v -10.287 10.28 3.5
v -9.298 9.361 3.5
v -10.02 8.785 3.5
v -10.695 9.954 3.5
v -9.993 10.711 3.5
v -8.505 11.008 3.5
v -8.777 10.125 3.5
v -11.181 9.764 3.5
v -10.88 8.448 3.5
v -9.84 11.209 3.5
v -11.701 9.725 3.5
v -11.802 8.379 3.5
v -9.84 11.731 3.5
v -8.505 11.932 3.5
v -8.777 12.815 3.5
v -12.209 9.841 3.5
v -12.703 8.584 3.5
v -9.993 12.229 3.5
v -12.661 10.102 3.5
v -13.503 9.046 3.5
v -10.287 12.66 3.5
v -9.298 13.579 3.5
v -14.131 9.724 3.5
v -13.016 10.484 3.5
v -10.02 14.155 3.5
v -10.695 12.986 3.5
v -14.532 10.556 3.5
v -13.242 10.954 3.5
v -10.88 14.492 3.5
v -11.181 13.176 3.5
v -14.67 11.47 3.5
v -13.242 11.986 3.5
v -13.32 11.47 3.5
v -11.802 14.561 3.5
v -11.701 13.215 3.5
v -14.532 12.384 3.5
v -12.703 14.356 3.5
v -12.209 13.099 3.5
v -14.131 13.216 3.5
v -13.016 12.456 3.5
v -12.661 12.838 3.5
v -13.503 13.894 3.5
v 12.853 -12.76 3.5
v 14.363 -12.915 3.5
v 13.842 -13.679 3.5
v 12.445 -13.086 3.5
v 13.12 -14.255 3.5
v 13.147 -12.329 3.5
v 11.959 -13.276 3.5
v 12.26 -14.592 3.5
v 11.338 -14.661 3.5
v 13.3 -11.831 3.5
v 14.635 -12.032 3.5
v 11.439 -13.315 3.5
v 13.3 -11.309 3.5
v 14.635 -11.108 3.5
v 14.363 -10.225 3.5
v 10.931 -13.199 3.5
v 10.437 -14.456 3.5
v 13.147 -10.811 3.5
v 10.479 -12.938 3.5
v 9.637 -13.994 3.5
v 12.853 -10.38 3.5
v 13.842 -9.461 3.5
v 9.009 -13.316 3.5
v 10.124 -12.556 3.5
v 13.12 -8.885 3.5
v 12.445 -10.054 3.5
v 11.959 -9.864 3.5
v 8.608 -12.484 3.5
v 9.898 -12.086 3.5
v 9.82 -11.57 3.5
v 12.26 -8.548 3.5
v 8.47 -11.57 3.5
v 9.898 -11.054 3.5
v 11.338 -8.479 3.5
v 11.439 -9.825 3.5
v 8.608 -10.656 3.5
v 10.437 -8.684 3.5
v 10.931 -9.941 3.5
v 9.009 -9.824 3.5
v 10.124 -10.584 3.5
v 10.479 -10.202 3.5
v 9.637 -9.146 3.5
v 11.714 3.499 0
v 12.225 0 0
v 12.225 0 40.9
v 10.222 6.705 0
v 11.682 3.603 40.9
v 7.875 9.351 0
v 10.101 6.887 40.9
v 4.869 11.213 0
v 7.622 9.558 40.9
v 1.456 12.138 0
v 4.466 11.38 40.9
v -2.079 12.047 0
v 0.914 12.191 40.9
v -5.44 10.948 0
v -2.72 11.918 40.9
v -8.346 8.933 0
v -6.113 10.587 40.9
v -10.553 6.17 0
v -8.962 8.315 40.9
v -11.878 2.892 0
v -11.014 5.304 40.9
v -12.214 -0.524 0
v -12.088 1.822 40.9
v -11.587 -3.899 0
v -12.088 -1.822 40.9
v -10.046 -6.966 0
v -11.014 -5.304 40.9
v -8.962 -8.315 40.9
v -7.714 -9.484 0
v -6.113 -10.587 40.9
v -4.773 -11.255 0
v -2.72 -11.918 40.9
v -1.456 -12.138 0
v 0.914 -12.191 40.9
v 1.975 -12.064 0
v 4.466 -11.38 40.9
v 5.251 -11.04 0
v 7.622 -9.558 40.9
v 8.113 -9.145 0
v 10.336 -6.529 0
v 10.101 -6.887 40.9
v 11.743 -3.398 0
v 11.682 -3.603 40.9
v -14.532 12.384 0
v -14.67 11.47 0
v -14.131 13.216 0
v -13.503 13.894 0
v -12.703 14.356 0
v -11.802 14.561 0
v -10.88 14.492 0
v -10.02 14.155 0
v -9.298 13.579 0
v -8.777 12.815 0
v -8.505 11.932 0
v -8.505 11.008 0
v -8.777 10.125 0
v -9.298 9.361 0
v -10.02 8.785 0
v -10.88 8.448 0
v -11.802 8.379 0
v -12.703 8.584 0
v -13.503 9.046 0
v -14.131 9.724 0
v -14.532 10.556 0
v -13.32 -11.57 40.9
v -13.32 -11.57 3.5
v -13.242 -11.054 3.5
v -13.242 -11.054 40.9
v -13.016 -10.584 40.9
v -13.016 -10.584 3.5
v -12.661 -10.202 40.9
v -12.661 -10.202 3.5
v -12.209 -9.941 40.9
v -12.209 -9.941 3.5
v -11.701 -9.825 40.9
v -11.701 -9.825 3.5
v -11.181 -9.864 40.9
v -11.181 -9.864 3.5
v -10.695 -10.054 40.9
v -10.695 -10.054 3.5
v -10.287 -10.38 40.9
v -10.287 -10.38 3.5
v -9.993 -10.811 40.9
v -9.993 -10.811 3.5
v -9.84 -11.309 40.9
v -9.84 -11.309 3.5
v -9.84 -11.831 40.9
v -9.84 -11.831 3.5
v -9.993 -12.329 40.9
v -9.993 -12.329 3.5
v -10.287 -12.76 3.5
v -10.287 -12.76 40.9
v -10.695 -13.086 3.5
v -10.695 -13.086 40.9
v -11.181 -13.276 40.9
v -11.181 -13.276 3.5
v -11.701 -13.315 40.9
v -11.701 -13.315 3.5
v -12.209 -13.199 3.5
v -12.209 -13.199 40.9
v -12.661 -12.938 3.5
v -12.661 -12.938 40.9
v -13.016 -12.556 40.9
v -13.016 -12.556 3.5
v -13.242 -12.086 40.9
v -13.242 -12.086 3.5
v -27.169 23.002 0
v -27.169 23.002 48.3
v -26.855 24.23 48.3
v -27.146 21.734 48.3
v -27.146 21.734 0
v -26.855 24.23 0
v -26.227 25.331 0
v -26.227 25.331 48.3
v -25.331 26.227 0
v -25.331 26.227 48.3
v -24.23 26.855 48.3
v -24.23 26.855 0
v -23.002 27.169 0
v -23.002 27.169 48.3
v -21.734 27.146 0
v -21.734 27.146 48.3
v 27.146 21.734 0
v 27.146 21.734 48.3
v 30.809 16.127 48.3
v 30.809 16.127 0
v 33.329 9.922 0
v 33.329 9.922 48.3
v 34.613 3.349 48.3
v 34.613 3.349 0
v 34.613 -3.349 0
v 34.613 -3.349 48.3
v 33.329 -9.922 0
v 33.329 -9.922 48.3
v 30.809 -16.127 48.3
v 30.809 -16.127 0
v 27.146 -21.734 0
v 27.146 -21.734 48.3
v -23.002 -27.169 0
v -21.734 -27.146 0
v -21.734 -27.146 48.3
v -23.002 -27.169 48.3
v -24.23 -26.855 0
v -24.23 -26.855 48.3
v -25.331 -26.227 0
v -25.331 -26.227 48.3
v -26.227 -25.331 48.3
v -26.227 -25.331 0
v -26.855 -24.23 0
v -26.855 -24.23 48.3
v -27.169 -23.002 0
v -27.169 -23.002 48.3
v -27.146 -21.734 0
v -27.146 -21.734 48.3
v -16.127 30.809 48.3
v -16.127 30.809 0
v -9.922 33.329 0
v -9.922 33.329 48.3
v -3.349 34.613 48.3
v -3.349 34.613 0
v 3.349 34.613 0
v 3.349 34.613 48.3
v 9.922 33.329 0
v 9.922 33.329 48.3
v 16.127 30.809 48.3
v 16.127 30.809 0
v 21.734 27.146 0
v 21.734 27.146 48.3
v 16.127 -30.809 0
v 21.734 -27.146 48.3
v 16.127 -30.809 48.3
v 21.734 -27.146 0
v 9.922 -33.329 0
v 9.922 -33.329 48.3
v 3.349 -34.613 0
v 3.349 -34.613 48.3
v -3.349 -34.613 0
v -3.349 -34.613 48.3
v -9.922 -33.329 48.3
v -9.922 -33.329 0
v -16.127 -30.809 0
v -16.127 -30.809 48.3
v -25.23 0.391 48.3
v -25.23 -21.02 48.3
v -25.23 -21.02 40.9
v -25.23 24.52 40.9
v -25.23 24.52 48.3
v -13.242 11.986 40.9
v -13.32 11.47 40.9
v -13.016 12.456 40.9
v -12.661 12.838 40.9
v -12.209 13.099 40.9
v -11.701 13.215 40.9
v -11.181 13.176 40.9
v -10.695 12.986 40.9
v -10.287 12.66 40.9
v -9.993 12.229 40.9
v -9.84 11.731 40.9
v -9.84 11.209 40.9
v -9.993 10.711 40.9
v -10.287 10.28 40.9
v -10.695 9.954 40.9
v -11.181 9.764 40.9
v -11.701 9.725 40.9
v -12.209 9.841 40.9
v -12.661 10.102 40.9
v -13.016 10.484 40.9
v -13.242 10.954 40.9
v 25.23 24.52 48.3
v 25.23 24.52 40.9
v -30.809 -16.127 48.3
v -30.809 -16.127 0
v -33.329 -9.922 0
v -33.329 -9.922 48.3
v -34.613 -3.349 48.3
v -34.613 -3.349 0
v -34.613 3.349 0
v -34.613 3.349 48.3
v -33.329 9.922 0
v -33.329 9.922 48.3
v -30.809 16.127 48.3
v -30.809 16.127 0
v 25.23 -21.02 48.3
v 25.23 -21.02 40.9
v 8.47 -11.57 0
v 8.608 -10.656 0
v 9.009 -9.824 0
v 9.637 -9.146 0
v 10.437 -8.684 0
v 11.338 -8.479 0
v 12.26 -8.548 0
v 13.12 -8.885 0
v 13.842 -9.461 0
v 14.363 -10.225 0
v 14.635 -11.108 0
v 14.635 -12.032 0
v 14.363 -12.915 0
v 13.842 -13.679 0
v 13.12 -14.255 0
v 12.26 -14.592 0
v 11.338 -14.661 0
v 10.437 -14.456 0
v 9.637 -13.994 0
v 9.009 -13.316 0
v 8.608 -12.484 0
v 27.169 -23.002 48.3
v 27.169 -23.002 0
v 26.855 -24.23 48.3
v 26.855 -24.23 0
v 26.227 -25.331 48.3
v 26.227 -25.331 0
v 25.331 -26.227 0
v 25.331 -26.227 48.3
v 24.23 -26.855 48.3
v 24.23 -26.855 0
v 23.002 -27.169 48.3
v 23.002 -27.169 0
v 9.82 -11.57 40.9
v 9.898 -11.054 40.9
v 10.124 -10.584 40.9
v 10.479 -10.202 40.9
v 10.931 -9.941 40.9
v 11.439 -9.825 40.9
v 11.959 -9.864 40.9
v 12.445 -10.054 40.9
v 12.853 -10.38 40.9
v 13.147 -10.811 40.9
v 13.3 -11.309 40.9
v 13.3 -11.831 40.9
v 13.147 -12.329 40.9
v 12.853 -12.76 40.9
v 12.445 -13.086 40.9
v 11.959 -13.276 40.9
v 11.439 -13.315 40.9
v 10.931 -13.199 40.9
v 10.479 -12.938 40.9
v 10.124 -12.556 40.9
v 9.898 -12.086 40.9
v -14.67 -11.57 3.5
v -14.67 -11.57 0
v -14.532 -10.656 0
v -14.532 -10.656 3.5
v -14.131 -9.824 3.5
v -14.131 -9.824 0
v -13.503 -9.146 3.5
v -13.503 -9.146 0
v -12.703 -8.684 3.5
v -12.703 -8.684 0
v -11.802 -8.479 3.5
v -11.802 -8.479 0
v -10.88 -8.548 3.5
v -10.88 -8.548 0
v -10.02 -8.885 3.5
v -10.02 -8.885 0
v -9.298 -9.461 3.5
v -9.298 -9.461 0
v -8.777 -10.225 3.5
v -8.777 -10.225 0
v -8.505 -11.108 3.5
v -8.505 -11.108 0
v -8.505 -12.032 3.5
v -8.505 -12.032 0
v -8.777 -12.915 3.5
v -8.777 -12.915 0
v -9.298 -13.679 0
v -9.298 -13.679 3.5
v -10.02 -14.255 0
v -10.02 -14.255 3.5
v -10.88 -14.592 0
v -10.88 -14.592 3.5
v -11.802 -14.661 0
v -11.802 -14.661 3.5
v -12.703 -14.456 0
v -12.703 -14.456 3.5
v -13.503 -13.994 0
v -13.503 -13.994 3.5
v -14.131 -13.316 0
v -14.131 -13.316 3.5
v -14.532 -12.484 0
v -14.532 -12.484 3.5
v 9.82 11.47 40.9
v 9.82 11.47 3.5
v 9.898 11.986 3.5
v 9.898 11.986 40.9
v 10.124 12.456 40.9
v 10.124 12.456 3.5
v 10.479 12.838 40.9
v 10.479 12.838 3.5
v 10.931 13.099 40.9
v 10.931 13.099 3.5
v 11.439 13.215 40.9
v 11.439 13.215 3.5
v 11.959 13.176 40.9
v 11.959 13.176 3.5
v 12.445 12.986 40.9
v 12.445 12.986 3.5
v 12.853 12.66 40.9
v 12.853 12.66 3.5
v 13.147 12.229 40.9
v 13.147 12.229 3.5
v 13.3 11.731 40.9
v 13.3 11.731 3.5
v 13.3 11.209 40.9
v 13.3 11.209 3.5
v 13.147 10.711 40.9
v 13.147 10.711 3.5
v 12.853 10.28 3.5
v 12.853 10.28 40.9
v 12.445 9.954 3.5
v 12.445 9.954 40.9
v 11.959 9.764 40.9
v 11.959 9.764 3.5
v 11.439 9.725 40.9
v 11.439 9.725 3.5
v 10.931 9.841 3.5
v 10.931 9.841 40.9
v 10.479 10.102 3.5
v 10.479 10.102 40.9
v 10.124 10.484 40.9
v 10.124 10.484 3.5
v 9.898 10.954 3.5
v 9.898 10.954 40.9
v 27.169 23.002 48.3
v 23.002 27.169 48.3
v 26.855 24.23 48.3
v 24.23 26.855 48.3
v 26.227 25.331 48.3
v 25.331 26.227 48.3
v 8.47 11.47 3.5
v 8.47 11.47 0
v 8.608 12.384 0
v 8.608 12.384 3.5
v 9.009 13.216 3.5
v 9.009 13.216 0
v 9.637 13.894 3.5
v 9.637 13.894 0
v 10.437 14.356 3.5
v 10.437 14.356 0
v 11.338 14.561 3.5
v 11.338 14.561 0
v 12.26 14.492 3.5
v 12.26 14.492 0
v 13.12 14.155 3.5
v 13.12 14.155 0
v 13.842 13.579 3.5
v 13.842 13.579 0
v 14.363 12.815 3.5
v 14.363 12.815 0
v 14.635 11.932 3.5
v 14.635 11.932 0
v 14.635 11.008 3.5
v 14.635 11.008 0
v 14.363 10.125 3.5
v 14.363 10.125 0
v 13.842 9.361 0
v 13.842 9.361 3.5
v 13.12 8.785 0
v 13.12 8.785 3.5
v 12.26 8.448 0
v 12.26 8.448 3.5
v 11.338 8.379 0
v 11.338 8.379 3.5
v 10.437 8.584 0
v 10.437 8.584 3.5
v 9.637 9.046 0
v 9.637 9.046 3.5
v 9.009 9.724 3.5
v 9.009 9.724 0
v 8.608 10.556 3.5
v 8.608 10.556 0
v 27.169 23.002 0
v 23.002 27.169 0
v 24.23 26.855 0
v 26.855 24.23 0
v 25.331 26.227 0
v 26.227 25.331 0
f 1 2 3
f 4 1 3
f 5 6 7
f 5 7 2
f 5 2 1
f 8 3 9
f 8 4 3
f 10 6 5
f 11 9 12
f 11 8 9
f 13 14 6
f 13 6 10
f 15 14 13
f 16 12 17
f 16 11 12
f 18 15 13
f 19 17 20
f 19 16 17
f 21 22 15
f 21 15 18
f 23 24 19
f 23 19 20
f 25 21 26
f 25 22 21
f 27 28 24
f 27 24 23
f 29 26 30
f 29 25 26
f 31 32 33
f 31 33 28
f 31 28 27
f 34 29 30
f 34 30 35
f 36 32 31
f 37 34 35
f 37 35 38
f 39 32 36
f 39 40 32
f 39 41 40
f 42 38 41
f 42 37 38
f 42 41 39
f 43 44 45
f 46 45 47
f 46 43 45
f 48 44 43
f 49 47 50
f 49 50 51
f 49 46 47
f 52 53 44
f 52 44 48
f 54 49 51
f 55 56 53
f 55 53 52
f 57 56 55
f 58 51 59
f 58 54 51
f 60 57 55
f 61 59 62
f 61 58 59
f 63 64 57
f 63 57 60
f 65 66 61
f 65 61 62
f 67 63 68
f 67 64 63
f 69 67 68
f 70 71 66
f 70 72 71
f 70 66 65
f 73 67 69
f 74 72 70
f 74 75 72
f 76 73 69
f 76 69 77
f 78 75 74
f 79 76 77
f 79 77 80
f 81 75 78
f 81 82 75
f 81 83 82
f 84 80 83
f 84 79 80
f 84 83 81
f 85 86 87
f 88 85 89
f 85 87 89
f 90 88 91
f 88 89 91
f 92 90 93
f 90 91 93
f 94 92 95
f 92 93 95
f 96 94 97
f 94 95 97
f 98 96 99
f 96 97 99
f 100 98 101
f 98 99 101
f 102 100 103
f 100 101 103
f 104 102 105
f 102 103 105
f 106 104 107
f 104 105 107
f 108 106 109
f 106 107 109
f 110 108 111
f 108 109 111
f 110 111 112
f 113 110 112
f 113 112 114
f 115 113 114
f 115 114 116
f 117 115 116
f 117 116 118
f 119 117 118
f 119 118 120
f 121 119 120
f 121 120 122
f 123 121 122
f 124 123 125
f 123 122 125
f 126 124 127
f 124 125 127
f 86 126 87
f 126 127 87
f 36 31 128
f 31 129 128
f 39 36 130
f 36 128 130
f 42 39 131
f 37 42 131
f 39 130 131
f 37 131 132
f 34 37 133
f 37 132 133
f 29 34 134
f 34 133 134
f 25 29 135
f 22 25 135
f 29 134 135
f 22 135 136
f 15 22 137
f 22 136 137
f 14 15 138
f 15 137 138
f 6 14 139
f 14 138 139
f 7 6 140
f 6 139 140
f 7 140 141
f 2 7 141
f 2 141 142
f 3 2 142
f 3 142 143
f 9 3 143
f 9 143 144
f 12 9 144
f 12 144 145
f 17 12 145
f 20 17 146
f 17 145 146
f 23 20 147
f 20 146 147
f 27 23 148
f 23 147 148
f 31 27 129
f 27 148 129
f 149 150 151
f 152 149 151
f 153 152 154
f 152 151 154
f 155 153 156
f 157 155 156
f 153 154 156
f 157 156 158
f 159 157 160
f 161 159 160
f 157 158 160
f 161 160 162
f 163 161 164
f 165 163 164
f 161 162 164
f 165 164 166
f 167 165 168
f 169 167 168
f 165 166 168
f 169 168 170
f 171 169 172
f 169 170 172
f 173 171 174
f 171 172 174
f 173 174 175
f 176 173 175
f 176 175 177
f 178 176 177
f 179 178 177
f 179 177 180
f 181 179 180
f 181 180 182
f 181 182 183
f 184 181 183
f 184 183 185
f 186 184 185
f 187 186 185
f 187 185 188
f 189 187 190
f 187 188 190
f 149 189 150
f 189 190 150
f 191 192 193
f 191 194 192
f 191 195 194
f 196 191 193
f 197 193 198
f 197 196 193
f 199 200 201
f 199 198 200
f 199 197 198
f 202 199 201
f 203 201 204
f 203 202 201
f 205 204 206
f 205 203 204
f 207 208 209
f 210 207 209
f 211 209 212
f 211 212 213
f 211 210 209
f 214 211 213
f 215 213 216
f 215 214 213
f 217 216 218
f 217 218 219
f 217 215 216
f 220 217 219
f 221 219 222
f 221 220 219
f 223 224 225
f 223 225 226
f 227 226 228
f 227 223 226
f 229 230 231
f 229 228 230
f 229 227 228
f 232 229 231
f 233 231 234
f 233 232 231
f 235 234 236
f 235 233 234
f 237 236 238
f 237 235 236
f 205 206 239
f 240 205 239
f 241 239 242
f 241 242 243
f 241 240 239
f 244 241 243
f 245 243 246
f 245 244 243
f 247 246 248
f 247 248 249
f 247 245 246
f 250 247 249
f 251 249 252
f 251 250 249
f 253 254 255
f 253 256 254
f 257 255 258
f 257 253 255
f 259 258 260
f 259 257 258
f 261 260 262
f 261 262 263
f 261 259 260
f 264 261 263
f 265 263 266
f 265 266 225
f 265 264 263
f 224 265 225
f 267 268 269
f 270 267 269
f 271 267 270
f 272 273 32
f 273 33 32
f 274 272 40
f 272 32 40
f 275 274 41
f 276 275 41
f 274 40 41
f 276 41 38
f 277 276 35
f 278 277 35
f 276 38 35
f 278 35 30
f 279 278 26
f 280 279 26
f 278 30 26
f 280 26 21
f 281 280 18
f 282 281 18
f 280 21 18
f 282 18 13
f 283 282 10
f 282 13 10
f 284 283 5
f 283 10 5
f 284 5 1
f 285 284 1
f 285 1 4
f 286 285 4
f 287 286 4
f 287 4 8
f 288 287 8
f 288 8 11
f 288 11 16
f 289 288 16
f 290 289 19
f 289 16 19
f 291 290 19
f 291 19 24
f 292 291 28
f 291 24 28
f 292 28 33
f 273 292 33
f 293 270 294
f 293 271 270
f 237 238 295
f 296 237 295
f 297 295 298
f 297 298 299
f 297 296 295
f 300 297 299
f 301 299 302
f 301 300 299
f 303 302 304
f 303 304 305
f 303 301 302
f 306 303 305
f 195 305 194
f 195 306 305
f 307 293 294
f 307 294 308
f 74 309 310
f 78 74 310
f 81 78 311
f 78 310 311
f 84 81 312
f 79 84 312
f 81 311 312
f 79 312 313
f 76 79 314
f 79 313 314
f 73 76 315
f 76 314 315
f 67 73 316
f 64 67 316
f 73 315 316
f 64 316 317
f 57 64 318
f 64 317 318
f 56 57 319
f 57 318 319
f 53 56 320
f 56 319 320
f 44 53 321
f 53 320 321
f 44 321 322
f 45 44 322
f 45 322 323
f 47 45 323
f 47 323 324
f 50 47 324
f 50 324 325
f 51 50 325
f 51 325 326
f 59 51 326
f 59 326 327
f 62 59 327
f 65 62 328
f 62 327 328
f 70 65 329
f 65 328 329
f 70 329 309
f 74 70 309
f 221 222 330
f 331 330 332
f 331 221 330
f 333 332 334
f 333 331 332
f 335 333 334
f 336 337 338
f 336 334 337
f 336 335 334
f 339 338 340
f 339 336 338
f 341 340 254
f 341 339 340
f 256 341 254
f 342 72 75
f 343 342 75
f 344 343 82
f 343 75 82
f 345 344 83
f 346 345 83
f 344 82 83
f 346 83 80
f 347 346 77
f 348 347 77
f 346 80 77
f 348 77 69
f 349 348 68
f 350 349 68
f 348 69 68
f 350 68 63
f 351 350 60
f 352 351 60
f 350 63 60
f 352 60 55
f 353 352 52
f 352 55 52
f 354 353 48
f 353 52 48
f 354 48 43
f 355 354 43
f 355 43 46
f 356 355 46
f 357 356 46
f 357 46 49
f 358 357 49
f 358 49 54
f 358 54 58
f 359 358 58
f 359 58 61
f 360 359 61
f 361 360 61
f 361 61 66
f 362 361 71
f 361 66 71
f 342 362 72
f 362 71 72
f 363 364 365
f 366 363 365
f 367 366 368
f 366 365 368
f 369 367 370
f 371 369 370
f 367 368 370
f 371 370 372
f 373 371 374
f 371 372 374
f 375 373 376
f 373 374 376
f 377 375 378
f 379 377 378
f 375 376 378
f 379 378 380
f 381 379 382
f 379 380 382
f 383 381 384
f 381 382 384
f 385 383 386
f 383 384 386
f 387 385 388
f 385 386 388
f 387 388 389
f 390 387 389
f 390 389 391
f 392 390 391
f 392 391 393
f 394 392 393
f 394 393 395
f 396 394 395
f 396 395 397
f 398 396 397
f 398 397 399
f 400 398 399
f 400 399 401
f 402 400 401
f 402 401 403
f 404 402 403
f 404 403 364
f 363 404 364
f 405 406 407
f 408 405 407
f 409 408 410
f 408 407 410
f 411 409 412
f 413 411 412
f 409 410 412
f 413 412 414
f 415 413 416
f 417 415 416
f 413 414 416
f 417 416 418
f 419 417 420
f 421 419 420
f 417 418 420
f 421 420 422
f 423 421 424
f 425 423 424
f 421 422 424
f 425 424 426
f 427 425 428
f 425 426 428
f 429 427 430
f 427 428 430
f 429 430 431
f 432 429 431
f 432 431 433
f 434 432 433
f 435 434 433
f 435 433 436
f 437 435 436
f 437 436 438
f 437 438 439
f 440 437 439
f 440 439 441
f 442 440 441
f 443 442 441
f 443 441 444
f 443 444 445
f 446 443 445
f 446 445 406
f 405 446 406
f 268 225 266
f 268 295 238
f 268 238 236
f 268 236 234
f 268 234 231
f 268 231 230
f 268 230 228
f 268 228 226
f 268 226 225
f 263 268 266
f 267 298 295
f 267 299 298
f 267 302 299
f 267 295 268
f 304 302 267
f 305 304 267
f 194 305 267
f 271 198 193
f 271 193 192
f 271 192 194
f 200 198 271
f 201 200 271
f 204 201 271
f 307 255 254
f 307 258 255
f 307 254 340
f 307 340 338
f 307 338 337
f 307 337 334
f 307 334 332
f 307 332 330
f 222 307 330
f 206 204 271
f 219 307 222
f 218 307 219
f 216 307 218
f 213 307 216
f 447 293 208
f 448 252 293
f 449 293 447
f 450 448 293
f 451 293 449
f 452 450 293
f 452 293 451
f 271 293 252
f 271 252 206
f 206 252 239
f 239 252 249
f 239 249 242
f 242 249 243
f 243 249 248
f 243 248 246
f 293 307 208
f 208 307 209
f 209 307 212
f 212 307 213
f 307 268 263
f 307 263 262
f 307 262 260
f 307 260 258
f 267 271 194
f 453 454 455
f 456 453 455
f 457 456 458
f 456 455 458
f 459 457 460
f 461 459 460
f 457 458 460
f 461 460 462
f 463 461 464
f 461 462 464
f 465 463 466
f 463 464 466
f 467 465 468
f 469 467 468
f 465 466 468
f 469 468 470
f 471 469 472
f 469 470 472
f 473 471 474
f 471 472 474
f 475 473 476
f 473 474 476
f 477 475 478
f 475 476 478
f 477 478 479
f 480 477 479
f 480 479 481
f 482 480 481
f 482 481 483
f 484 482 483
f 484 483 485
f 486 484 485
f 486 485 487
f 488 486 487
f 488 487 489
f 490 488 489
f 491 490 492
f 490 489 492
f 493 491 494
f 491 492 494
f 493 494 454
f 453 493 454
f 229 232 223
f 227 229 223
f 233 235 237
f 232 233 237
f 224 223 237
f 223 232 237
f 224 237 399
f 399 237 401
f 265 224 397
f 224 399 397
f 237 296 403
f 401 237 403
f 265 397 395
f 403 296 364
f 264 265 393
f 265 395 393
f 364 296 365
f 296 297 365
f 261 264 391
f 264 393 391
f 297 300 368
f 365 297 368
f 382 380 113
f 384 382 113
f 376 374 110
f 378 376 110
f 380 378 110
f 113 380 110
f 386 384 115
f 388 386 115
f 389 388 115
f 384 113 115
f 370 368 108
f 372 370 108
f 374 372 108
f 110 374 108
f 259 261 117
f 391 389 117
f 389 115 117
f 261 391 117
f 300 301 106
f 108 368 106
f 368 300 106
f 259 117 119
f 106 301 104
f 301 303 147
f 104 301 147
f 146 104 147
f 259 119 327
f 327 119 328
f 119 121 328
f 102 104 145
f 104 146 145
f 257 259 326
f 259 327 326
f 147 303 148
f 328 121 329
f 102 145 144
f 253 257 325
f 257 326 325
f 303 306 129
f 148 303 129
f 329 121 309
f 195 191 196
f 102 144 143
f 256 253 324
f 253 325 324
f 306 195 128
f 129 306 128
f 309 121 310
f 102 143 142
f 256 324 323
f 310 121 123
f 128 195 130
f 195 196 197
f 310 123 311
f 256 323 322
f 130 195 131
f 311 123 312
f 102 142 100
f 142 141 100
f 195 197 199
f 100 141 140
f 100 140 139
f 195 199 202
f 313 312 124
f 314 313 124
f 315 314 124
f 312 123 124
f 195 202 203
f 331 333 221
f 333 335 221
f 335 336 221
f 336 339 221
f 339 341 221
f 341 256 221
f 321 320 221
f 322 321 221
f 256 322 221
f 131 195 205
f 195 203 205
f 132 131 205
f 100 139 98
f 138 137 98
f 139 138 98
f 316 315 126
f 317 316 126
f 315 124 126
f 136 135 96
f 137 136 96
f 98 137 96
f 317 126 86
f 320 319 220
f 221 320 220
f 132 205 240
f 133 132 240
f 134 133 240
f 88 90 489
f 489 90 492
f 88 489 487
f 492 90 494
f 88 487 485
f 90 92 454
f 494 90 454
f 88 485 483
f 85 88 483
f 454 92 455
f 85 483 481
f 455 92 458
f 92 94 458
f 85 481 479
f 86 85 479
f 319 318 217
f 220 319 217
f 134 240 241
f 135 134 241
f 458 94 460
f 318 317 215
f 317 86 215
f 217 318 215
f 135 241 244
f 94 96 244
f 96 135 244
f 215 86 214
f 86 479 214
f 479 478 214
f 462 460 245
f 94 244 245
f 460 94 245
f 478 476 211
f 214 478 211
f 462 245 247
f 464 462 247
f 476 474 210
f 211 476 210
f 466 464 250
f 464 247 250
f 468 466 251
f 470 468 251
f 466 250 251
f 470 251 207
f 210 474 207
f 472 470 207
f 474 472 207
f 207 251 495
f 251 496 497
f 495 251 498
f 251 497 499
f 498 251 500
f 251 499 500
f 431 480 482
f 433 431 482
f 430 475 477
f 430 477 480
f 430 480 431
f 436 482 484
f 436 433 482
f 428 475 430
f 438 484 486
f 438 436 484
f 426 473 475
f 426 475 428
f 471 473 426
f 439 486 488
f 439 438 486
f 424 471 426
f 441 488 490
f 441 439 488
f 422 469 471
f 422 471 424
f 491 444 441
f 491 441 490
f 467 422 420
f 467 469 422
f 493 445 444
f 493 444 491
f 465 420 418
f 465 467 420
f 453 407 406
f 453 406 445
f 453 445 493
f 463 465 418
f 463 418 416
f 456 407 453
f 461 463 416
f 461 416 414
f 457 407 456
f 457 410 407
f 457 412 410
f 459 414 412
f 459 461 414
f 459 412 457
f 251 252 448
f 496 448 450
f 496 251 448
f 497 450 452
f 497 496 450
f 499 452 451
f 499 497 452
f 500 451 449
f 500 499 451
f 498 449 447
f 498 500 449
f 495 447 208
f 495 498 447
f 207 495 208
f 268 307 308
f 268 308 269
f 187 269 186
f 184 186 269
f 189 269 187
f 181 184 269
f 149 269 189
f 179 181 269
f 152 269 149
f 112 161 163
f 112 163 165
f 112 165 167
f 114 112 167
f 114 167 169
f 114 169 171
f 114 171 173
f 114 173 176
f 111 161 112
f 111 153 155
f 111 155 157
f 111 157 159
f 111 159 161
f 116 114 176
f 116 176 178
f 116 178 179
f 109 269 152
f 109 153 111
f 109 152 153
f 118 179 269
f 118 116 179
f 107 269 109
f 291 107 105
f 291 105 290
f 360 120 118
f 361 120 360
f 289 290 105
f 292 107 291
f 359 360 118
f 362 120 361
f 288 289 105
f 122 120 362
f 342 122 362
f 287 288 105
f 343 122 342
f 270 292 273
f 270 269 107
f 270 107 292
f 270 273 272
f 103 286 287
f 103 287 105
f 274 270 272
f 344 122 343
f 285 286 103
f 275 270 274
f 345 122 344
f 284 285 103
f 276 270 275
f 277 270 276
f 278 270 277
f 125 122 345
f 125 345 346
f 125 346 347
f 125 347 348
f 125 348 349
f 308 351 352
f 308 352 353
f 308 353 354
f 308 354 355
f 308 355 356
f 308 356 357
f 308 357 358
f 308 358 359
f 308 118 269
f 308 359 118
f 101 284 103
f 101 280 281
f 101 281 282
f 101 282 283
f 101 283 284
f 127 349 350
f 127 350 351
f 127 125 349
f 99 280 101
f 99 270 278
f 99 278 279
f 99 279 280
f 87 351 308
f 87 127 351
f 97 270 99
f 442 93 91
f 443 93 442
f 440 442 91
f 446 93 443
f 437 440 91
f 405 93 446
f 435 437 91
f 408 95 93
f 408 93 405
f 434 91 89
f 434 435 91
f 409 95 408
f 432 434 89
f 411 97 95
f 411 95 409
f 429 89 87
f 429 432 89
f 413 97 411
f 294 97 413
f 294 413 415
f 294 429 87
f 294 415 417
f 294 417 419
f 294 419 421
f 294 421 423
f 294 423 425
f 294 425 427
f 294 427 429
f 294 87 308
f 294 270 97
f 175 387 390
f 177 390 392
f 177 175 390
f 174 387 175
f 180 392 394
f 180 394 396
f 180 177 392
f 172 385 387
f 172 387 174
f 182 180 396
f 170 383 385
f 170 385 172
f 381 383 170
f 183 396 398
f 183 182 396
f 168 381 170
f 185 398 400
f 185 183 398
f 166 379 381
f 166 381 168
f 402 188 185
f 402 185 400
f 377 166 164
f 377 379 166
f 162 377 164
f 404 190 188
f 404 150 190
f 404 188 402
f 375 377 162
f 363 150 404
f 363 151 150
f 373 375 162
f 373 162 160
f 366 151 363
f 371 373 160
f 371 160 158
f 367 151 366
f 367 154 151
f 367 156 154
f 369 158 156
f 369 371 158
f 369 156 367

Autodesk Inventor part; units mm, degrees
ref_plane "YZ Plane" through (0, 0, 0) normal (1, 0, 0) x (0, 1, 0)
ref_plane "XZ Plane" through (0, 0, 0) normal (0, 1, 0) x (-1, 0, 0)
ref_plane "XY Plane" through (0, 0, 0) normal (0, 0, 1) x (1, 0, 0)
sketch "Sketch1" plane through (0, 0, 0) normal (0, 0, 1) x (1, 0, 0)
  circle A0 centre (0, 0) radius 11.25
  circle A1 centre (0, 0) radius 37.0304
  arc A2 (-32.7929, -17.201) -> (-31.2929, -19.799) centre (0, 0) ccw
  line L0 (-32.7929, -17.201) -> (-31.0547, -16.1974)
  line L1 (-32.7929, -17.201) -> (-31.0547, -16.1974)
  line L2 (-29.5547, -18.7955) -> (-31.2929, -19.799)
  line L3 (-31.2929, -19.799) -> (-29.5547, -18.7955)
  line L4 (-16.1974, -31.0547) -> (-17.201, -32.7929)
  line L5 (-17.201, -32.7929) -> (-16.1974, -31.0547)
  arc A3 (-19.799, -31.2929) -> (-17.201, -32.7929) centre (0, 0) ccw
  line L6 (-19.799, -31.2929) -> (-18.7955, -29.5547)
  line L7 (-19.799, -31.2929) -> (-18.7955, -29.5547)
  arc A4 (17.201, -32.7929) -> (19.799, -31.2929) centre (0, 0) ccw
  line L8 (17.201, -32.7929) -> (16.1974, -31.0547)
  line L9 (17.201, -32.7929) -> (16.1974, -31.0547)
  line L10 (18.7955, -29.5547) -> (19.799, -31.2929)
  line L11 (19.799, -31.2929) -> (18.7955, -29.5547)
  arc A5 (31.2929, -19.799) -> (32.7929, -17.201) centre (0, 0) ccw
  line L12 (31.2929, -19.799) -> (29.5547, -18.7955)
  line L13 (31.0547, -16.1974) -> (32.7929, -17.201)
  line L14 (32.7929, -17.201) -> (31.0547, -16.1974)
  line L15 (32.7929, 17.201) -> (31.0547, 16.1974)
  line L16 (32.7929, 17.201) -> (31.0547, 16.1974)
  arc A6 (32.7929, 17.201) -> (31.2929, 19.799) centre (0, 0) ccw
  line L17 (29.5547, 18.7955) -> (31.2929, 19.799)
  line L18 (31.2929, 19.799) -> (29.5547, 18.7955)
  line L19 (16.1974, 31.0547) -> (17.201, 32.7929)
  line L20 (17.201, 32.7929) -> (16.1974, 31.0547)
  line L21 (19.799, 31.2929) -> (18.7955, 29.5547)
  line L22 (19.799, 31.2929) -> (18.7955, 29.5547)
  line L23 (-17.201, 32.7929) -> (-16.1974, 31.0547)
  line L24 (-17.201, 32.7929) -> (-16.1974, 31.0547)
  line L25 (-18.7955, 29.5547) -> (-19.799, 31.2929)
  line L26 (-19.799, 31.2929) -> (-18.7955, 29.5547)
  arc A7 (-31.2929, 19.799) -> (-32.7929, 17.201) centre (0, 0) ccw
  line L27 (-31.2929, 19.799) -> (-29.5547, 18.7955)
  line L28 (-31.2929, 19.799) -> (-29.5547, 18.7955)
  line L29 (-31.0547, 16.1974) -> (-32.7929, 17.201)
  line L30 (-32.7929, 17.201) -> (-31.0547, 16.1974)
  arc A8 (-21.806, -27.4089) -> (-27.4089, -21.806) centre (-22.4506, -22.4506) ccw
  circle A9 centre (-31.75, 0) radius 5
  arc A10 (-3.9618, 34.8002) -> (-2.3096, 31.8679) centre (-22.4506, 22.4506) ccw
  circle A11 centre (-22.4506, 22.4506) radius 5
  circle A12 centre (22.4506, 22.4506) radius 5
  circle A13 centre (22.4506, 22.4506) radius 5
  arc A14 (-3.9618, -34.8002) -> (-1.7951, -38.6456) centre (22.4506, -22.4506) ccw
  circle A15 centre (22.4506, -22.4506) radius 5
  circle A16 centre (-22.4506, 22.4506) radius 4.75
  circle A17 centre (-22.4506, -22.4506) radius 4.75
  circle A18 centre (22.4506, -22.4506) radius 4.75
  circle A19 centre (22.4506, 22.4506) radius 4.75
  circle A20 centre (0, 0) radius 34.775
  circle A21 centre (0, 0) radius 36.75
  point P0 (0, 0)
  point P1 (0, 49.75)
  point P2 (27.1463, 21.7343)
  point P3 (21.7343, 27.1463)
  point P4 (-21.7343, 27.1463)
  point P5 (-27.1463, 21.7343)
  point P6 (-27.1463, -21.7343)
  point P7 (-21.7343, -27.1463)
  point P8 (21.7343, -27.1463)
  point P9 (27.1463, -21.7343)
  dimension "d6" = 70.05
  dimension "d8" = 74.0608
  dimension "d0" = 10
  dimension "d1" = 0.25
  dimension "d4" = 360
  dimension "d7" = 0.25
  dimension "d9" = 73.5
extrude "Extrusion1" add sketch "Sketch1" along normal blind 48.3 contours A0 A10 | A9 A20 A11 A12 A15 A8 | A9 A20 A10 | A10 A20 A9 | A10 A0 | A20 A16 A11 | A8 A20 A17 | A20 A16 | A16 A20 | A20 A17 | A17 A20 | A15 A20 A18 | A20 A19 A12 | A20 A18 | A18 A20 | A20 A19 | A19 A20 picked at (-31.3962, -1.5997) picked at (-30.2693, 2.6951) picked at (-26.6756, 20.1619) picked at (20.1869, -26.6901) picked at (20.1869, 26.6901)
sketch "Skizze6" plane through (0, 0, 48.3) normal (0, 0, 1) x (1, 0, 0)
  circle A0 centre (0, 0) radius 12.225
  dimension "d33" = 24.45
extrude "Extrusion6" cut sketch "Skizze6" against normal through all
sketch "Skizze7" plane through (0, 0, 48.3) normal (0, 0, 1) x (1, 0, 0)
  line L0 (0, 0) -> (0, 1.75)
  line L1 (-25.23, 24.52) -> (25.23, 24.52)
  line L2 (25.23, 24.52) -> (25.23, -21.02)
  line L3 (25.23, -21.02) -> (-25.23, -21.02)
  line L4 (-25.23, -21.02) -> (-25.23, 24.52)
  line L5 (-25.23, 24.52) -> (25.23, -21.02) construction
  line L6 (25.23, 24.52) -> (-25.23, -21.02) construction
  dimension "d48" = 1.75
  dimension "d49" = 50.46
  dimension "d50" = 45.54
extrude "Extrusion7" cut sketch "Skizze7" against normal blind 7.4
sketch "Skizze8" plane through (0, 0, 0) normal (0, 0, -1) x (-1, 0, 0)
  circle A0 centre (0, 0) radius 12.225 projected
  line L0 (-11.57, 11.47) -> (11.57, 11.47)
  line L1 (11.57, 11.57) -> (11.57, -11.57)
  line L2 (11.57, -11.57) -> (-11.57, -11.57)
  line L3 (-11.57, -11.57) -> (-11.57, 11.57)
  line L4 (-11.57, 11.57) -> (11.57, -11.57) construction
  line L5 (11.57, 11.57) -> (-11.57, -11.57) construction
  circle A1 centre (-11.57, 11.47) radius 1.75
  circle A2 centre (11.57, 11.47) radius 1.75
  circle A3 centre (11.57, -11.57) radius 1.75
  circle A4 centre (-11.57, -11.57) radius 1.75
  dimension "d40" = 23.14
  dimension "d41" = 23.14
  dimension "d42" = 3.5
  dimension "d43" = 3.5
  dimension "d44" = 3.5
  dimension "d45" = 3.5
extrude "Extrusion8" cut sketch "Skizze8" against normal through all contours A2 L0 L1 | L1 L0 A2 | A3 L2 L1 | L1 L2 A3 | A1 L3 L0 | L0 L3 A1 | A4 L3 L2 | L2 L3 A4
sketch "Skizze9" plane through (0, 0, 0) normal (0, 0, -1) x (-1, 0, 0)
  circle A0 centre (-11.57, 11.47) radius 1.75 projected
  circle A1 centre (11.57, 11.47) radius 1.75 projected
  circle A2 centre (11.57, -11.57) radius 1.75 projected
  circle A3 centre (-11.57, -11.57) radius 1.75 projected
  circle A4 centre (-11.57, 11.47) radius 3.1
  circle A5 centre (11.57, 11.47) radius 3.1
  circle A6 centre (11.57, -11.57) radius 3.1
  circle A7 centre (-11.57, -11.57) radius 3.1
  point P0 (0, 0)
  dimension "d51" = 6.2
  dimension "d52" = 6.2
  dimension "d53" = 6.2
  dimension "d54" = 6.2
extrude "Extrusion9" cut sketch "Skizze9" against normal blind 3.5 contours A0 | A1 | A2 | A3 | A4 | A5 | A6 | A7
properties part number "2024_09_13_beam_combiner_blende_UHP_LED"
